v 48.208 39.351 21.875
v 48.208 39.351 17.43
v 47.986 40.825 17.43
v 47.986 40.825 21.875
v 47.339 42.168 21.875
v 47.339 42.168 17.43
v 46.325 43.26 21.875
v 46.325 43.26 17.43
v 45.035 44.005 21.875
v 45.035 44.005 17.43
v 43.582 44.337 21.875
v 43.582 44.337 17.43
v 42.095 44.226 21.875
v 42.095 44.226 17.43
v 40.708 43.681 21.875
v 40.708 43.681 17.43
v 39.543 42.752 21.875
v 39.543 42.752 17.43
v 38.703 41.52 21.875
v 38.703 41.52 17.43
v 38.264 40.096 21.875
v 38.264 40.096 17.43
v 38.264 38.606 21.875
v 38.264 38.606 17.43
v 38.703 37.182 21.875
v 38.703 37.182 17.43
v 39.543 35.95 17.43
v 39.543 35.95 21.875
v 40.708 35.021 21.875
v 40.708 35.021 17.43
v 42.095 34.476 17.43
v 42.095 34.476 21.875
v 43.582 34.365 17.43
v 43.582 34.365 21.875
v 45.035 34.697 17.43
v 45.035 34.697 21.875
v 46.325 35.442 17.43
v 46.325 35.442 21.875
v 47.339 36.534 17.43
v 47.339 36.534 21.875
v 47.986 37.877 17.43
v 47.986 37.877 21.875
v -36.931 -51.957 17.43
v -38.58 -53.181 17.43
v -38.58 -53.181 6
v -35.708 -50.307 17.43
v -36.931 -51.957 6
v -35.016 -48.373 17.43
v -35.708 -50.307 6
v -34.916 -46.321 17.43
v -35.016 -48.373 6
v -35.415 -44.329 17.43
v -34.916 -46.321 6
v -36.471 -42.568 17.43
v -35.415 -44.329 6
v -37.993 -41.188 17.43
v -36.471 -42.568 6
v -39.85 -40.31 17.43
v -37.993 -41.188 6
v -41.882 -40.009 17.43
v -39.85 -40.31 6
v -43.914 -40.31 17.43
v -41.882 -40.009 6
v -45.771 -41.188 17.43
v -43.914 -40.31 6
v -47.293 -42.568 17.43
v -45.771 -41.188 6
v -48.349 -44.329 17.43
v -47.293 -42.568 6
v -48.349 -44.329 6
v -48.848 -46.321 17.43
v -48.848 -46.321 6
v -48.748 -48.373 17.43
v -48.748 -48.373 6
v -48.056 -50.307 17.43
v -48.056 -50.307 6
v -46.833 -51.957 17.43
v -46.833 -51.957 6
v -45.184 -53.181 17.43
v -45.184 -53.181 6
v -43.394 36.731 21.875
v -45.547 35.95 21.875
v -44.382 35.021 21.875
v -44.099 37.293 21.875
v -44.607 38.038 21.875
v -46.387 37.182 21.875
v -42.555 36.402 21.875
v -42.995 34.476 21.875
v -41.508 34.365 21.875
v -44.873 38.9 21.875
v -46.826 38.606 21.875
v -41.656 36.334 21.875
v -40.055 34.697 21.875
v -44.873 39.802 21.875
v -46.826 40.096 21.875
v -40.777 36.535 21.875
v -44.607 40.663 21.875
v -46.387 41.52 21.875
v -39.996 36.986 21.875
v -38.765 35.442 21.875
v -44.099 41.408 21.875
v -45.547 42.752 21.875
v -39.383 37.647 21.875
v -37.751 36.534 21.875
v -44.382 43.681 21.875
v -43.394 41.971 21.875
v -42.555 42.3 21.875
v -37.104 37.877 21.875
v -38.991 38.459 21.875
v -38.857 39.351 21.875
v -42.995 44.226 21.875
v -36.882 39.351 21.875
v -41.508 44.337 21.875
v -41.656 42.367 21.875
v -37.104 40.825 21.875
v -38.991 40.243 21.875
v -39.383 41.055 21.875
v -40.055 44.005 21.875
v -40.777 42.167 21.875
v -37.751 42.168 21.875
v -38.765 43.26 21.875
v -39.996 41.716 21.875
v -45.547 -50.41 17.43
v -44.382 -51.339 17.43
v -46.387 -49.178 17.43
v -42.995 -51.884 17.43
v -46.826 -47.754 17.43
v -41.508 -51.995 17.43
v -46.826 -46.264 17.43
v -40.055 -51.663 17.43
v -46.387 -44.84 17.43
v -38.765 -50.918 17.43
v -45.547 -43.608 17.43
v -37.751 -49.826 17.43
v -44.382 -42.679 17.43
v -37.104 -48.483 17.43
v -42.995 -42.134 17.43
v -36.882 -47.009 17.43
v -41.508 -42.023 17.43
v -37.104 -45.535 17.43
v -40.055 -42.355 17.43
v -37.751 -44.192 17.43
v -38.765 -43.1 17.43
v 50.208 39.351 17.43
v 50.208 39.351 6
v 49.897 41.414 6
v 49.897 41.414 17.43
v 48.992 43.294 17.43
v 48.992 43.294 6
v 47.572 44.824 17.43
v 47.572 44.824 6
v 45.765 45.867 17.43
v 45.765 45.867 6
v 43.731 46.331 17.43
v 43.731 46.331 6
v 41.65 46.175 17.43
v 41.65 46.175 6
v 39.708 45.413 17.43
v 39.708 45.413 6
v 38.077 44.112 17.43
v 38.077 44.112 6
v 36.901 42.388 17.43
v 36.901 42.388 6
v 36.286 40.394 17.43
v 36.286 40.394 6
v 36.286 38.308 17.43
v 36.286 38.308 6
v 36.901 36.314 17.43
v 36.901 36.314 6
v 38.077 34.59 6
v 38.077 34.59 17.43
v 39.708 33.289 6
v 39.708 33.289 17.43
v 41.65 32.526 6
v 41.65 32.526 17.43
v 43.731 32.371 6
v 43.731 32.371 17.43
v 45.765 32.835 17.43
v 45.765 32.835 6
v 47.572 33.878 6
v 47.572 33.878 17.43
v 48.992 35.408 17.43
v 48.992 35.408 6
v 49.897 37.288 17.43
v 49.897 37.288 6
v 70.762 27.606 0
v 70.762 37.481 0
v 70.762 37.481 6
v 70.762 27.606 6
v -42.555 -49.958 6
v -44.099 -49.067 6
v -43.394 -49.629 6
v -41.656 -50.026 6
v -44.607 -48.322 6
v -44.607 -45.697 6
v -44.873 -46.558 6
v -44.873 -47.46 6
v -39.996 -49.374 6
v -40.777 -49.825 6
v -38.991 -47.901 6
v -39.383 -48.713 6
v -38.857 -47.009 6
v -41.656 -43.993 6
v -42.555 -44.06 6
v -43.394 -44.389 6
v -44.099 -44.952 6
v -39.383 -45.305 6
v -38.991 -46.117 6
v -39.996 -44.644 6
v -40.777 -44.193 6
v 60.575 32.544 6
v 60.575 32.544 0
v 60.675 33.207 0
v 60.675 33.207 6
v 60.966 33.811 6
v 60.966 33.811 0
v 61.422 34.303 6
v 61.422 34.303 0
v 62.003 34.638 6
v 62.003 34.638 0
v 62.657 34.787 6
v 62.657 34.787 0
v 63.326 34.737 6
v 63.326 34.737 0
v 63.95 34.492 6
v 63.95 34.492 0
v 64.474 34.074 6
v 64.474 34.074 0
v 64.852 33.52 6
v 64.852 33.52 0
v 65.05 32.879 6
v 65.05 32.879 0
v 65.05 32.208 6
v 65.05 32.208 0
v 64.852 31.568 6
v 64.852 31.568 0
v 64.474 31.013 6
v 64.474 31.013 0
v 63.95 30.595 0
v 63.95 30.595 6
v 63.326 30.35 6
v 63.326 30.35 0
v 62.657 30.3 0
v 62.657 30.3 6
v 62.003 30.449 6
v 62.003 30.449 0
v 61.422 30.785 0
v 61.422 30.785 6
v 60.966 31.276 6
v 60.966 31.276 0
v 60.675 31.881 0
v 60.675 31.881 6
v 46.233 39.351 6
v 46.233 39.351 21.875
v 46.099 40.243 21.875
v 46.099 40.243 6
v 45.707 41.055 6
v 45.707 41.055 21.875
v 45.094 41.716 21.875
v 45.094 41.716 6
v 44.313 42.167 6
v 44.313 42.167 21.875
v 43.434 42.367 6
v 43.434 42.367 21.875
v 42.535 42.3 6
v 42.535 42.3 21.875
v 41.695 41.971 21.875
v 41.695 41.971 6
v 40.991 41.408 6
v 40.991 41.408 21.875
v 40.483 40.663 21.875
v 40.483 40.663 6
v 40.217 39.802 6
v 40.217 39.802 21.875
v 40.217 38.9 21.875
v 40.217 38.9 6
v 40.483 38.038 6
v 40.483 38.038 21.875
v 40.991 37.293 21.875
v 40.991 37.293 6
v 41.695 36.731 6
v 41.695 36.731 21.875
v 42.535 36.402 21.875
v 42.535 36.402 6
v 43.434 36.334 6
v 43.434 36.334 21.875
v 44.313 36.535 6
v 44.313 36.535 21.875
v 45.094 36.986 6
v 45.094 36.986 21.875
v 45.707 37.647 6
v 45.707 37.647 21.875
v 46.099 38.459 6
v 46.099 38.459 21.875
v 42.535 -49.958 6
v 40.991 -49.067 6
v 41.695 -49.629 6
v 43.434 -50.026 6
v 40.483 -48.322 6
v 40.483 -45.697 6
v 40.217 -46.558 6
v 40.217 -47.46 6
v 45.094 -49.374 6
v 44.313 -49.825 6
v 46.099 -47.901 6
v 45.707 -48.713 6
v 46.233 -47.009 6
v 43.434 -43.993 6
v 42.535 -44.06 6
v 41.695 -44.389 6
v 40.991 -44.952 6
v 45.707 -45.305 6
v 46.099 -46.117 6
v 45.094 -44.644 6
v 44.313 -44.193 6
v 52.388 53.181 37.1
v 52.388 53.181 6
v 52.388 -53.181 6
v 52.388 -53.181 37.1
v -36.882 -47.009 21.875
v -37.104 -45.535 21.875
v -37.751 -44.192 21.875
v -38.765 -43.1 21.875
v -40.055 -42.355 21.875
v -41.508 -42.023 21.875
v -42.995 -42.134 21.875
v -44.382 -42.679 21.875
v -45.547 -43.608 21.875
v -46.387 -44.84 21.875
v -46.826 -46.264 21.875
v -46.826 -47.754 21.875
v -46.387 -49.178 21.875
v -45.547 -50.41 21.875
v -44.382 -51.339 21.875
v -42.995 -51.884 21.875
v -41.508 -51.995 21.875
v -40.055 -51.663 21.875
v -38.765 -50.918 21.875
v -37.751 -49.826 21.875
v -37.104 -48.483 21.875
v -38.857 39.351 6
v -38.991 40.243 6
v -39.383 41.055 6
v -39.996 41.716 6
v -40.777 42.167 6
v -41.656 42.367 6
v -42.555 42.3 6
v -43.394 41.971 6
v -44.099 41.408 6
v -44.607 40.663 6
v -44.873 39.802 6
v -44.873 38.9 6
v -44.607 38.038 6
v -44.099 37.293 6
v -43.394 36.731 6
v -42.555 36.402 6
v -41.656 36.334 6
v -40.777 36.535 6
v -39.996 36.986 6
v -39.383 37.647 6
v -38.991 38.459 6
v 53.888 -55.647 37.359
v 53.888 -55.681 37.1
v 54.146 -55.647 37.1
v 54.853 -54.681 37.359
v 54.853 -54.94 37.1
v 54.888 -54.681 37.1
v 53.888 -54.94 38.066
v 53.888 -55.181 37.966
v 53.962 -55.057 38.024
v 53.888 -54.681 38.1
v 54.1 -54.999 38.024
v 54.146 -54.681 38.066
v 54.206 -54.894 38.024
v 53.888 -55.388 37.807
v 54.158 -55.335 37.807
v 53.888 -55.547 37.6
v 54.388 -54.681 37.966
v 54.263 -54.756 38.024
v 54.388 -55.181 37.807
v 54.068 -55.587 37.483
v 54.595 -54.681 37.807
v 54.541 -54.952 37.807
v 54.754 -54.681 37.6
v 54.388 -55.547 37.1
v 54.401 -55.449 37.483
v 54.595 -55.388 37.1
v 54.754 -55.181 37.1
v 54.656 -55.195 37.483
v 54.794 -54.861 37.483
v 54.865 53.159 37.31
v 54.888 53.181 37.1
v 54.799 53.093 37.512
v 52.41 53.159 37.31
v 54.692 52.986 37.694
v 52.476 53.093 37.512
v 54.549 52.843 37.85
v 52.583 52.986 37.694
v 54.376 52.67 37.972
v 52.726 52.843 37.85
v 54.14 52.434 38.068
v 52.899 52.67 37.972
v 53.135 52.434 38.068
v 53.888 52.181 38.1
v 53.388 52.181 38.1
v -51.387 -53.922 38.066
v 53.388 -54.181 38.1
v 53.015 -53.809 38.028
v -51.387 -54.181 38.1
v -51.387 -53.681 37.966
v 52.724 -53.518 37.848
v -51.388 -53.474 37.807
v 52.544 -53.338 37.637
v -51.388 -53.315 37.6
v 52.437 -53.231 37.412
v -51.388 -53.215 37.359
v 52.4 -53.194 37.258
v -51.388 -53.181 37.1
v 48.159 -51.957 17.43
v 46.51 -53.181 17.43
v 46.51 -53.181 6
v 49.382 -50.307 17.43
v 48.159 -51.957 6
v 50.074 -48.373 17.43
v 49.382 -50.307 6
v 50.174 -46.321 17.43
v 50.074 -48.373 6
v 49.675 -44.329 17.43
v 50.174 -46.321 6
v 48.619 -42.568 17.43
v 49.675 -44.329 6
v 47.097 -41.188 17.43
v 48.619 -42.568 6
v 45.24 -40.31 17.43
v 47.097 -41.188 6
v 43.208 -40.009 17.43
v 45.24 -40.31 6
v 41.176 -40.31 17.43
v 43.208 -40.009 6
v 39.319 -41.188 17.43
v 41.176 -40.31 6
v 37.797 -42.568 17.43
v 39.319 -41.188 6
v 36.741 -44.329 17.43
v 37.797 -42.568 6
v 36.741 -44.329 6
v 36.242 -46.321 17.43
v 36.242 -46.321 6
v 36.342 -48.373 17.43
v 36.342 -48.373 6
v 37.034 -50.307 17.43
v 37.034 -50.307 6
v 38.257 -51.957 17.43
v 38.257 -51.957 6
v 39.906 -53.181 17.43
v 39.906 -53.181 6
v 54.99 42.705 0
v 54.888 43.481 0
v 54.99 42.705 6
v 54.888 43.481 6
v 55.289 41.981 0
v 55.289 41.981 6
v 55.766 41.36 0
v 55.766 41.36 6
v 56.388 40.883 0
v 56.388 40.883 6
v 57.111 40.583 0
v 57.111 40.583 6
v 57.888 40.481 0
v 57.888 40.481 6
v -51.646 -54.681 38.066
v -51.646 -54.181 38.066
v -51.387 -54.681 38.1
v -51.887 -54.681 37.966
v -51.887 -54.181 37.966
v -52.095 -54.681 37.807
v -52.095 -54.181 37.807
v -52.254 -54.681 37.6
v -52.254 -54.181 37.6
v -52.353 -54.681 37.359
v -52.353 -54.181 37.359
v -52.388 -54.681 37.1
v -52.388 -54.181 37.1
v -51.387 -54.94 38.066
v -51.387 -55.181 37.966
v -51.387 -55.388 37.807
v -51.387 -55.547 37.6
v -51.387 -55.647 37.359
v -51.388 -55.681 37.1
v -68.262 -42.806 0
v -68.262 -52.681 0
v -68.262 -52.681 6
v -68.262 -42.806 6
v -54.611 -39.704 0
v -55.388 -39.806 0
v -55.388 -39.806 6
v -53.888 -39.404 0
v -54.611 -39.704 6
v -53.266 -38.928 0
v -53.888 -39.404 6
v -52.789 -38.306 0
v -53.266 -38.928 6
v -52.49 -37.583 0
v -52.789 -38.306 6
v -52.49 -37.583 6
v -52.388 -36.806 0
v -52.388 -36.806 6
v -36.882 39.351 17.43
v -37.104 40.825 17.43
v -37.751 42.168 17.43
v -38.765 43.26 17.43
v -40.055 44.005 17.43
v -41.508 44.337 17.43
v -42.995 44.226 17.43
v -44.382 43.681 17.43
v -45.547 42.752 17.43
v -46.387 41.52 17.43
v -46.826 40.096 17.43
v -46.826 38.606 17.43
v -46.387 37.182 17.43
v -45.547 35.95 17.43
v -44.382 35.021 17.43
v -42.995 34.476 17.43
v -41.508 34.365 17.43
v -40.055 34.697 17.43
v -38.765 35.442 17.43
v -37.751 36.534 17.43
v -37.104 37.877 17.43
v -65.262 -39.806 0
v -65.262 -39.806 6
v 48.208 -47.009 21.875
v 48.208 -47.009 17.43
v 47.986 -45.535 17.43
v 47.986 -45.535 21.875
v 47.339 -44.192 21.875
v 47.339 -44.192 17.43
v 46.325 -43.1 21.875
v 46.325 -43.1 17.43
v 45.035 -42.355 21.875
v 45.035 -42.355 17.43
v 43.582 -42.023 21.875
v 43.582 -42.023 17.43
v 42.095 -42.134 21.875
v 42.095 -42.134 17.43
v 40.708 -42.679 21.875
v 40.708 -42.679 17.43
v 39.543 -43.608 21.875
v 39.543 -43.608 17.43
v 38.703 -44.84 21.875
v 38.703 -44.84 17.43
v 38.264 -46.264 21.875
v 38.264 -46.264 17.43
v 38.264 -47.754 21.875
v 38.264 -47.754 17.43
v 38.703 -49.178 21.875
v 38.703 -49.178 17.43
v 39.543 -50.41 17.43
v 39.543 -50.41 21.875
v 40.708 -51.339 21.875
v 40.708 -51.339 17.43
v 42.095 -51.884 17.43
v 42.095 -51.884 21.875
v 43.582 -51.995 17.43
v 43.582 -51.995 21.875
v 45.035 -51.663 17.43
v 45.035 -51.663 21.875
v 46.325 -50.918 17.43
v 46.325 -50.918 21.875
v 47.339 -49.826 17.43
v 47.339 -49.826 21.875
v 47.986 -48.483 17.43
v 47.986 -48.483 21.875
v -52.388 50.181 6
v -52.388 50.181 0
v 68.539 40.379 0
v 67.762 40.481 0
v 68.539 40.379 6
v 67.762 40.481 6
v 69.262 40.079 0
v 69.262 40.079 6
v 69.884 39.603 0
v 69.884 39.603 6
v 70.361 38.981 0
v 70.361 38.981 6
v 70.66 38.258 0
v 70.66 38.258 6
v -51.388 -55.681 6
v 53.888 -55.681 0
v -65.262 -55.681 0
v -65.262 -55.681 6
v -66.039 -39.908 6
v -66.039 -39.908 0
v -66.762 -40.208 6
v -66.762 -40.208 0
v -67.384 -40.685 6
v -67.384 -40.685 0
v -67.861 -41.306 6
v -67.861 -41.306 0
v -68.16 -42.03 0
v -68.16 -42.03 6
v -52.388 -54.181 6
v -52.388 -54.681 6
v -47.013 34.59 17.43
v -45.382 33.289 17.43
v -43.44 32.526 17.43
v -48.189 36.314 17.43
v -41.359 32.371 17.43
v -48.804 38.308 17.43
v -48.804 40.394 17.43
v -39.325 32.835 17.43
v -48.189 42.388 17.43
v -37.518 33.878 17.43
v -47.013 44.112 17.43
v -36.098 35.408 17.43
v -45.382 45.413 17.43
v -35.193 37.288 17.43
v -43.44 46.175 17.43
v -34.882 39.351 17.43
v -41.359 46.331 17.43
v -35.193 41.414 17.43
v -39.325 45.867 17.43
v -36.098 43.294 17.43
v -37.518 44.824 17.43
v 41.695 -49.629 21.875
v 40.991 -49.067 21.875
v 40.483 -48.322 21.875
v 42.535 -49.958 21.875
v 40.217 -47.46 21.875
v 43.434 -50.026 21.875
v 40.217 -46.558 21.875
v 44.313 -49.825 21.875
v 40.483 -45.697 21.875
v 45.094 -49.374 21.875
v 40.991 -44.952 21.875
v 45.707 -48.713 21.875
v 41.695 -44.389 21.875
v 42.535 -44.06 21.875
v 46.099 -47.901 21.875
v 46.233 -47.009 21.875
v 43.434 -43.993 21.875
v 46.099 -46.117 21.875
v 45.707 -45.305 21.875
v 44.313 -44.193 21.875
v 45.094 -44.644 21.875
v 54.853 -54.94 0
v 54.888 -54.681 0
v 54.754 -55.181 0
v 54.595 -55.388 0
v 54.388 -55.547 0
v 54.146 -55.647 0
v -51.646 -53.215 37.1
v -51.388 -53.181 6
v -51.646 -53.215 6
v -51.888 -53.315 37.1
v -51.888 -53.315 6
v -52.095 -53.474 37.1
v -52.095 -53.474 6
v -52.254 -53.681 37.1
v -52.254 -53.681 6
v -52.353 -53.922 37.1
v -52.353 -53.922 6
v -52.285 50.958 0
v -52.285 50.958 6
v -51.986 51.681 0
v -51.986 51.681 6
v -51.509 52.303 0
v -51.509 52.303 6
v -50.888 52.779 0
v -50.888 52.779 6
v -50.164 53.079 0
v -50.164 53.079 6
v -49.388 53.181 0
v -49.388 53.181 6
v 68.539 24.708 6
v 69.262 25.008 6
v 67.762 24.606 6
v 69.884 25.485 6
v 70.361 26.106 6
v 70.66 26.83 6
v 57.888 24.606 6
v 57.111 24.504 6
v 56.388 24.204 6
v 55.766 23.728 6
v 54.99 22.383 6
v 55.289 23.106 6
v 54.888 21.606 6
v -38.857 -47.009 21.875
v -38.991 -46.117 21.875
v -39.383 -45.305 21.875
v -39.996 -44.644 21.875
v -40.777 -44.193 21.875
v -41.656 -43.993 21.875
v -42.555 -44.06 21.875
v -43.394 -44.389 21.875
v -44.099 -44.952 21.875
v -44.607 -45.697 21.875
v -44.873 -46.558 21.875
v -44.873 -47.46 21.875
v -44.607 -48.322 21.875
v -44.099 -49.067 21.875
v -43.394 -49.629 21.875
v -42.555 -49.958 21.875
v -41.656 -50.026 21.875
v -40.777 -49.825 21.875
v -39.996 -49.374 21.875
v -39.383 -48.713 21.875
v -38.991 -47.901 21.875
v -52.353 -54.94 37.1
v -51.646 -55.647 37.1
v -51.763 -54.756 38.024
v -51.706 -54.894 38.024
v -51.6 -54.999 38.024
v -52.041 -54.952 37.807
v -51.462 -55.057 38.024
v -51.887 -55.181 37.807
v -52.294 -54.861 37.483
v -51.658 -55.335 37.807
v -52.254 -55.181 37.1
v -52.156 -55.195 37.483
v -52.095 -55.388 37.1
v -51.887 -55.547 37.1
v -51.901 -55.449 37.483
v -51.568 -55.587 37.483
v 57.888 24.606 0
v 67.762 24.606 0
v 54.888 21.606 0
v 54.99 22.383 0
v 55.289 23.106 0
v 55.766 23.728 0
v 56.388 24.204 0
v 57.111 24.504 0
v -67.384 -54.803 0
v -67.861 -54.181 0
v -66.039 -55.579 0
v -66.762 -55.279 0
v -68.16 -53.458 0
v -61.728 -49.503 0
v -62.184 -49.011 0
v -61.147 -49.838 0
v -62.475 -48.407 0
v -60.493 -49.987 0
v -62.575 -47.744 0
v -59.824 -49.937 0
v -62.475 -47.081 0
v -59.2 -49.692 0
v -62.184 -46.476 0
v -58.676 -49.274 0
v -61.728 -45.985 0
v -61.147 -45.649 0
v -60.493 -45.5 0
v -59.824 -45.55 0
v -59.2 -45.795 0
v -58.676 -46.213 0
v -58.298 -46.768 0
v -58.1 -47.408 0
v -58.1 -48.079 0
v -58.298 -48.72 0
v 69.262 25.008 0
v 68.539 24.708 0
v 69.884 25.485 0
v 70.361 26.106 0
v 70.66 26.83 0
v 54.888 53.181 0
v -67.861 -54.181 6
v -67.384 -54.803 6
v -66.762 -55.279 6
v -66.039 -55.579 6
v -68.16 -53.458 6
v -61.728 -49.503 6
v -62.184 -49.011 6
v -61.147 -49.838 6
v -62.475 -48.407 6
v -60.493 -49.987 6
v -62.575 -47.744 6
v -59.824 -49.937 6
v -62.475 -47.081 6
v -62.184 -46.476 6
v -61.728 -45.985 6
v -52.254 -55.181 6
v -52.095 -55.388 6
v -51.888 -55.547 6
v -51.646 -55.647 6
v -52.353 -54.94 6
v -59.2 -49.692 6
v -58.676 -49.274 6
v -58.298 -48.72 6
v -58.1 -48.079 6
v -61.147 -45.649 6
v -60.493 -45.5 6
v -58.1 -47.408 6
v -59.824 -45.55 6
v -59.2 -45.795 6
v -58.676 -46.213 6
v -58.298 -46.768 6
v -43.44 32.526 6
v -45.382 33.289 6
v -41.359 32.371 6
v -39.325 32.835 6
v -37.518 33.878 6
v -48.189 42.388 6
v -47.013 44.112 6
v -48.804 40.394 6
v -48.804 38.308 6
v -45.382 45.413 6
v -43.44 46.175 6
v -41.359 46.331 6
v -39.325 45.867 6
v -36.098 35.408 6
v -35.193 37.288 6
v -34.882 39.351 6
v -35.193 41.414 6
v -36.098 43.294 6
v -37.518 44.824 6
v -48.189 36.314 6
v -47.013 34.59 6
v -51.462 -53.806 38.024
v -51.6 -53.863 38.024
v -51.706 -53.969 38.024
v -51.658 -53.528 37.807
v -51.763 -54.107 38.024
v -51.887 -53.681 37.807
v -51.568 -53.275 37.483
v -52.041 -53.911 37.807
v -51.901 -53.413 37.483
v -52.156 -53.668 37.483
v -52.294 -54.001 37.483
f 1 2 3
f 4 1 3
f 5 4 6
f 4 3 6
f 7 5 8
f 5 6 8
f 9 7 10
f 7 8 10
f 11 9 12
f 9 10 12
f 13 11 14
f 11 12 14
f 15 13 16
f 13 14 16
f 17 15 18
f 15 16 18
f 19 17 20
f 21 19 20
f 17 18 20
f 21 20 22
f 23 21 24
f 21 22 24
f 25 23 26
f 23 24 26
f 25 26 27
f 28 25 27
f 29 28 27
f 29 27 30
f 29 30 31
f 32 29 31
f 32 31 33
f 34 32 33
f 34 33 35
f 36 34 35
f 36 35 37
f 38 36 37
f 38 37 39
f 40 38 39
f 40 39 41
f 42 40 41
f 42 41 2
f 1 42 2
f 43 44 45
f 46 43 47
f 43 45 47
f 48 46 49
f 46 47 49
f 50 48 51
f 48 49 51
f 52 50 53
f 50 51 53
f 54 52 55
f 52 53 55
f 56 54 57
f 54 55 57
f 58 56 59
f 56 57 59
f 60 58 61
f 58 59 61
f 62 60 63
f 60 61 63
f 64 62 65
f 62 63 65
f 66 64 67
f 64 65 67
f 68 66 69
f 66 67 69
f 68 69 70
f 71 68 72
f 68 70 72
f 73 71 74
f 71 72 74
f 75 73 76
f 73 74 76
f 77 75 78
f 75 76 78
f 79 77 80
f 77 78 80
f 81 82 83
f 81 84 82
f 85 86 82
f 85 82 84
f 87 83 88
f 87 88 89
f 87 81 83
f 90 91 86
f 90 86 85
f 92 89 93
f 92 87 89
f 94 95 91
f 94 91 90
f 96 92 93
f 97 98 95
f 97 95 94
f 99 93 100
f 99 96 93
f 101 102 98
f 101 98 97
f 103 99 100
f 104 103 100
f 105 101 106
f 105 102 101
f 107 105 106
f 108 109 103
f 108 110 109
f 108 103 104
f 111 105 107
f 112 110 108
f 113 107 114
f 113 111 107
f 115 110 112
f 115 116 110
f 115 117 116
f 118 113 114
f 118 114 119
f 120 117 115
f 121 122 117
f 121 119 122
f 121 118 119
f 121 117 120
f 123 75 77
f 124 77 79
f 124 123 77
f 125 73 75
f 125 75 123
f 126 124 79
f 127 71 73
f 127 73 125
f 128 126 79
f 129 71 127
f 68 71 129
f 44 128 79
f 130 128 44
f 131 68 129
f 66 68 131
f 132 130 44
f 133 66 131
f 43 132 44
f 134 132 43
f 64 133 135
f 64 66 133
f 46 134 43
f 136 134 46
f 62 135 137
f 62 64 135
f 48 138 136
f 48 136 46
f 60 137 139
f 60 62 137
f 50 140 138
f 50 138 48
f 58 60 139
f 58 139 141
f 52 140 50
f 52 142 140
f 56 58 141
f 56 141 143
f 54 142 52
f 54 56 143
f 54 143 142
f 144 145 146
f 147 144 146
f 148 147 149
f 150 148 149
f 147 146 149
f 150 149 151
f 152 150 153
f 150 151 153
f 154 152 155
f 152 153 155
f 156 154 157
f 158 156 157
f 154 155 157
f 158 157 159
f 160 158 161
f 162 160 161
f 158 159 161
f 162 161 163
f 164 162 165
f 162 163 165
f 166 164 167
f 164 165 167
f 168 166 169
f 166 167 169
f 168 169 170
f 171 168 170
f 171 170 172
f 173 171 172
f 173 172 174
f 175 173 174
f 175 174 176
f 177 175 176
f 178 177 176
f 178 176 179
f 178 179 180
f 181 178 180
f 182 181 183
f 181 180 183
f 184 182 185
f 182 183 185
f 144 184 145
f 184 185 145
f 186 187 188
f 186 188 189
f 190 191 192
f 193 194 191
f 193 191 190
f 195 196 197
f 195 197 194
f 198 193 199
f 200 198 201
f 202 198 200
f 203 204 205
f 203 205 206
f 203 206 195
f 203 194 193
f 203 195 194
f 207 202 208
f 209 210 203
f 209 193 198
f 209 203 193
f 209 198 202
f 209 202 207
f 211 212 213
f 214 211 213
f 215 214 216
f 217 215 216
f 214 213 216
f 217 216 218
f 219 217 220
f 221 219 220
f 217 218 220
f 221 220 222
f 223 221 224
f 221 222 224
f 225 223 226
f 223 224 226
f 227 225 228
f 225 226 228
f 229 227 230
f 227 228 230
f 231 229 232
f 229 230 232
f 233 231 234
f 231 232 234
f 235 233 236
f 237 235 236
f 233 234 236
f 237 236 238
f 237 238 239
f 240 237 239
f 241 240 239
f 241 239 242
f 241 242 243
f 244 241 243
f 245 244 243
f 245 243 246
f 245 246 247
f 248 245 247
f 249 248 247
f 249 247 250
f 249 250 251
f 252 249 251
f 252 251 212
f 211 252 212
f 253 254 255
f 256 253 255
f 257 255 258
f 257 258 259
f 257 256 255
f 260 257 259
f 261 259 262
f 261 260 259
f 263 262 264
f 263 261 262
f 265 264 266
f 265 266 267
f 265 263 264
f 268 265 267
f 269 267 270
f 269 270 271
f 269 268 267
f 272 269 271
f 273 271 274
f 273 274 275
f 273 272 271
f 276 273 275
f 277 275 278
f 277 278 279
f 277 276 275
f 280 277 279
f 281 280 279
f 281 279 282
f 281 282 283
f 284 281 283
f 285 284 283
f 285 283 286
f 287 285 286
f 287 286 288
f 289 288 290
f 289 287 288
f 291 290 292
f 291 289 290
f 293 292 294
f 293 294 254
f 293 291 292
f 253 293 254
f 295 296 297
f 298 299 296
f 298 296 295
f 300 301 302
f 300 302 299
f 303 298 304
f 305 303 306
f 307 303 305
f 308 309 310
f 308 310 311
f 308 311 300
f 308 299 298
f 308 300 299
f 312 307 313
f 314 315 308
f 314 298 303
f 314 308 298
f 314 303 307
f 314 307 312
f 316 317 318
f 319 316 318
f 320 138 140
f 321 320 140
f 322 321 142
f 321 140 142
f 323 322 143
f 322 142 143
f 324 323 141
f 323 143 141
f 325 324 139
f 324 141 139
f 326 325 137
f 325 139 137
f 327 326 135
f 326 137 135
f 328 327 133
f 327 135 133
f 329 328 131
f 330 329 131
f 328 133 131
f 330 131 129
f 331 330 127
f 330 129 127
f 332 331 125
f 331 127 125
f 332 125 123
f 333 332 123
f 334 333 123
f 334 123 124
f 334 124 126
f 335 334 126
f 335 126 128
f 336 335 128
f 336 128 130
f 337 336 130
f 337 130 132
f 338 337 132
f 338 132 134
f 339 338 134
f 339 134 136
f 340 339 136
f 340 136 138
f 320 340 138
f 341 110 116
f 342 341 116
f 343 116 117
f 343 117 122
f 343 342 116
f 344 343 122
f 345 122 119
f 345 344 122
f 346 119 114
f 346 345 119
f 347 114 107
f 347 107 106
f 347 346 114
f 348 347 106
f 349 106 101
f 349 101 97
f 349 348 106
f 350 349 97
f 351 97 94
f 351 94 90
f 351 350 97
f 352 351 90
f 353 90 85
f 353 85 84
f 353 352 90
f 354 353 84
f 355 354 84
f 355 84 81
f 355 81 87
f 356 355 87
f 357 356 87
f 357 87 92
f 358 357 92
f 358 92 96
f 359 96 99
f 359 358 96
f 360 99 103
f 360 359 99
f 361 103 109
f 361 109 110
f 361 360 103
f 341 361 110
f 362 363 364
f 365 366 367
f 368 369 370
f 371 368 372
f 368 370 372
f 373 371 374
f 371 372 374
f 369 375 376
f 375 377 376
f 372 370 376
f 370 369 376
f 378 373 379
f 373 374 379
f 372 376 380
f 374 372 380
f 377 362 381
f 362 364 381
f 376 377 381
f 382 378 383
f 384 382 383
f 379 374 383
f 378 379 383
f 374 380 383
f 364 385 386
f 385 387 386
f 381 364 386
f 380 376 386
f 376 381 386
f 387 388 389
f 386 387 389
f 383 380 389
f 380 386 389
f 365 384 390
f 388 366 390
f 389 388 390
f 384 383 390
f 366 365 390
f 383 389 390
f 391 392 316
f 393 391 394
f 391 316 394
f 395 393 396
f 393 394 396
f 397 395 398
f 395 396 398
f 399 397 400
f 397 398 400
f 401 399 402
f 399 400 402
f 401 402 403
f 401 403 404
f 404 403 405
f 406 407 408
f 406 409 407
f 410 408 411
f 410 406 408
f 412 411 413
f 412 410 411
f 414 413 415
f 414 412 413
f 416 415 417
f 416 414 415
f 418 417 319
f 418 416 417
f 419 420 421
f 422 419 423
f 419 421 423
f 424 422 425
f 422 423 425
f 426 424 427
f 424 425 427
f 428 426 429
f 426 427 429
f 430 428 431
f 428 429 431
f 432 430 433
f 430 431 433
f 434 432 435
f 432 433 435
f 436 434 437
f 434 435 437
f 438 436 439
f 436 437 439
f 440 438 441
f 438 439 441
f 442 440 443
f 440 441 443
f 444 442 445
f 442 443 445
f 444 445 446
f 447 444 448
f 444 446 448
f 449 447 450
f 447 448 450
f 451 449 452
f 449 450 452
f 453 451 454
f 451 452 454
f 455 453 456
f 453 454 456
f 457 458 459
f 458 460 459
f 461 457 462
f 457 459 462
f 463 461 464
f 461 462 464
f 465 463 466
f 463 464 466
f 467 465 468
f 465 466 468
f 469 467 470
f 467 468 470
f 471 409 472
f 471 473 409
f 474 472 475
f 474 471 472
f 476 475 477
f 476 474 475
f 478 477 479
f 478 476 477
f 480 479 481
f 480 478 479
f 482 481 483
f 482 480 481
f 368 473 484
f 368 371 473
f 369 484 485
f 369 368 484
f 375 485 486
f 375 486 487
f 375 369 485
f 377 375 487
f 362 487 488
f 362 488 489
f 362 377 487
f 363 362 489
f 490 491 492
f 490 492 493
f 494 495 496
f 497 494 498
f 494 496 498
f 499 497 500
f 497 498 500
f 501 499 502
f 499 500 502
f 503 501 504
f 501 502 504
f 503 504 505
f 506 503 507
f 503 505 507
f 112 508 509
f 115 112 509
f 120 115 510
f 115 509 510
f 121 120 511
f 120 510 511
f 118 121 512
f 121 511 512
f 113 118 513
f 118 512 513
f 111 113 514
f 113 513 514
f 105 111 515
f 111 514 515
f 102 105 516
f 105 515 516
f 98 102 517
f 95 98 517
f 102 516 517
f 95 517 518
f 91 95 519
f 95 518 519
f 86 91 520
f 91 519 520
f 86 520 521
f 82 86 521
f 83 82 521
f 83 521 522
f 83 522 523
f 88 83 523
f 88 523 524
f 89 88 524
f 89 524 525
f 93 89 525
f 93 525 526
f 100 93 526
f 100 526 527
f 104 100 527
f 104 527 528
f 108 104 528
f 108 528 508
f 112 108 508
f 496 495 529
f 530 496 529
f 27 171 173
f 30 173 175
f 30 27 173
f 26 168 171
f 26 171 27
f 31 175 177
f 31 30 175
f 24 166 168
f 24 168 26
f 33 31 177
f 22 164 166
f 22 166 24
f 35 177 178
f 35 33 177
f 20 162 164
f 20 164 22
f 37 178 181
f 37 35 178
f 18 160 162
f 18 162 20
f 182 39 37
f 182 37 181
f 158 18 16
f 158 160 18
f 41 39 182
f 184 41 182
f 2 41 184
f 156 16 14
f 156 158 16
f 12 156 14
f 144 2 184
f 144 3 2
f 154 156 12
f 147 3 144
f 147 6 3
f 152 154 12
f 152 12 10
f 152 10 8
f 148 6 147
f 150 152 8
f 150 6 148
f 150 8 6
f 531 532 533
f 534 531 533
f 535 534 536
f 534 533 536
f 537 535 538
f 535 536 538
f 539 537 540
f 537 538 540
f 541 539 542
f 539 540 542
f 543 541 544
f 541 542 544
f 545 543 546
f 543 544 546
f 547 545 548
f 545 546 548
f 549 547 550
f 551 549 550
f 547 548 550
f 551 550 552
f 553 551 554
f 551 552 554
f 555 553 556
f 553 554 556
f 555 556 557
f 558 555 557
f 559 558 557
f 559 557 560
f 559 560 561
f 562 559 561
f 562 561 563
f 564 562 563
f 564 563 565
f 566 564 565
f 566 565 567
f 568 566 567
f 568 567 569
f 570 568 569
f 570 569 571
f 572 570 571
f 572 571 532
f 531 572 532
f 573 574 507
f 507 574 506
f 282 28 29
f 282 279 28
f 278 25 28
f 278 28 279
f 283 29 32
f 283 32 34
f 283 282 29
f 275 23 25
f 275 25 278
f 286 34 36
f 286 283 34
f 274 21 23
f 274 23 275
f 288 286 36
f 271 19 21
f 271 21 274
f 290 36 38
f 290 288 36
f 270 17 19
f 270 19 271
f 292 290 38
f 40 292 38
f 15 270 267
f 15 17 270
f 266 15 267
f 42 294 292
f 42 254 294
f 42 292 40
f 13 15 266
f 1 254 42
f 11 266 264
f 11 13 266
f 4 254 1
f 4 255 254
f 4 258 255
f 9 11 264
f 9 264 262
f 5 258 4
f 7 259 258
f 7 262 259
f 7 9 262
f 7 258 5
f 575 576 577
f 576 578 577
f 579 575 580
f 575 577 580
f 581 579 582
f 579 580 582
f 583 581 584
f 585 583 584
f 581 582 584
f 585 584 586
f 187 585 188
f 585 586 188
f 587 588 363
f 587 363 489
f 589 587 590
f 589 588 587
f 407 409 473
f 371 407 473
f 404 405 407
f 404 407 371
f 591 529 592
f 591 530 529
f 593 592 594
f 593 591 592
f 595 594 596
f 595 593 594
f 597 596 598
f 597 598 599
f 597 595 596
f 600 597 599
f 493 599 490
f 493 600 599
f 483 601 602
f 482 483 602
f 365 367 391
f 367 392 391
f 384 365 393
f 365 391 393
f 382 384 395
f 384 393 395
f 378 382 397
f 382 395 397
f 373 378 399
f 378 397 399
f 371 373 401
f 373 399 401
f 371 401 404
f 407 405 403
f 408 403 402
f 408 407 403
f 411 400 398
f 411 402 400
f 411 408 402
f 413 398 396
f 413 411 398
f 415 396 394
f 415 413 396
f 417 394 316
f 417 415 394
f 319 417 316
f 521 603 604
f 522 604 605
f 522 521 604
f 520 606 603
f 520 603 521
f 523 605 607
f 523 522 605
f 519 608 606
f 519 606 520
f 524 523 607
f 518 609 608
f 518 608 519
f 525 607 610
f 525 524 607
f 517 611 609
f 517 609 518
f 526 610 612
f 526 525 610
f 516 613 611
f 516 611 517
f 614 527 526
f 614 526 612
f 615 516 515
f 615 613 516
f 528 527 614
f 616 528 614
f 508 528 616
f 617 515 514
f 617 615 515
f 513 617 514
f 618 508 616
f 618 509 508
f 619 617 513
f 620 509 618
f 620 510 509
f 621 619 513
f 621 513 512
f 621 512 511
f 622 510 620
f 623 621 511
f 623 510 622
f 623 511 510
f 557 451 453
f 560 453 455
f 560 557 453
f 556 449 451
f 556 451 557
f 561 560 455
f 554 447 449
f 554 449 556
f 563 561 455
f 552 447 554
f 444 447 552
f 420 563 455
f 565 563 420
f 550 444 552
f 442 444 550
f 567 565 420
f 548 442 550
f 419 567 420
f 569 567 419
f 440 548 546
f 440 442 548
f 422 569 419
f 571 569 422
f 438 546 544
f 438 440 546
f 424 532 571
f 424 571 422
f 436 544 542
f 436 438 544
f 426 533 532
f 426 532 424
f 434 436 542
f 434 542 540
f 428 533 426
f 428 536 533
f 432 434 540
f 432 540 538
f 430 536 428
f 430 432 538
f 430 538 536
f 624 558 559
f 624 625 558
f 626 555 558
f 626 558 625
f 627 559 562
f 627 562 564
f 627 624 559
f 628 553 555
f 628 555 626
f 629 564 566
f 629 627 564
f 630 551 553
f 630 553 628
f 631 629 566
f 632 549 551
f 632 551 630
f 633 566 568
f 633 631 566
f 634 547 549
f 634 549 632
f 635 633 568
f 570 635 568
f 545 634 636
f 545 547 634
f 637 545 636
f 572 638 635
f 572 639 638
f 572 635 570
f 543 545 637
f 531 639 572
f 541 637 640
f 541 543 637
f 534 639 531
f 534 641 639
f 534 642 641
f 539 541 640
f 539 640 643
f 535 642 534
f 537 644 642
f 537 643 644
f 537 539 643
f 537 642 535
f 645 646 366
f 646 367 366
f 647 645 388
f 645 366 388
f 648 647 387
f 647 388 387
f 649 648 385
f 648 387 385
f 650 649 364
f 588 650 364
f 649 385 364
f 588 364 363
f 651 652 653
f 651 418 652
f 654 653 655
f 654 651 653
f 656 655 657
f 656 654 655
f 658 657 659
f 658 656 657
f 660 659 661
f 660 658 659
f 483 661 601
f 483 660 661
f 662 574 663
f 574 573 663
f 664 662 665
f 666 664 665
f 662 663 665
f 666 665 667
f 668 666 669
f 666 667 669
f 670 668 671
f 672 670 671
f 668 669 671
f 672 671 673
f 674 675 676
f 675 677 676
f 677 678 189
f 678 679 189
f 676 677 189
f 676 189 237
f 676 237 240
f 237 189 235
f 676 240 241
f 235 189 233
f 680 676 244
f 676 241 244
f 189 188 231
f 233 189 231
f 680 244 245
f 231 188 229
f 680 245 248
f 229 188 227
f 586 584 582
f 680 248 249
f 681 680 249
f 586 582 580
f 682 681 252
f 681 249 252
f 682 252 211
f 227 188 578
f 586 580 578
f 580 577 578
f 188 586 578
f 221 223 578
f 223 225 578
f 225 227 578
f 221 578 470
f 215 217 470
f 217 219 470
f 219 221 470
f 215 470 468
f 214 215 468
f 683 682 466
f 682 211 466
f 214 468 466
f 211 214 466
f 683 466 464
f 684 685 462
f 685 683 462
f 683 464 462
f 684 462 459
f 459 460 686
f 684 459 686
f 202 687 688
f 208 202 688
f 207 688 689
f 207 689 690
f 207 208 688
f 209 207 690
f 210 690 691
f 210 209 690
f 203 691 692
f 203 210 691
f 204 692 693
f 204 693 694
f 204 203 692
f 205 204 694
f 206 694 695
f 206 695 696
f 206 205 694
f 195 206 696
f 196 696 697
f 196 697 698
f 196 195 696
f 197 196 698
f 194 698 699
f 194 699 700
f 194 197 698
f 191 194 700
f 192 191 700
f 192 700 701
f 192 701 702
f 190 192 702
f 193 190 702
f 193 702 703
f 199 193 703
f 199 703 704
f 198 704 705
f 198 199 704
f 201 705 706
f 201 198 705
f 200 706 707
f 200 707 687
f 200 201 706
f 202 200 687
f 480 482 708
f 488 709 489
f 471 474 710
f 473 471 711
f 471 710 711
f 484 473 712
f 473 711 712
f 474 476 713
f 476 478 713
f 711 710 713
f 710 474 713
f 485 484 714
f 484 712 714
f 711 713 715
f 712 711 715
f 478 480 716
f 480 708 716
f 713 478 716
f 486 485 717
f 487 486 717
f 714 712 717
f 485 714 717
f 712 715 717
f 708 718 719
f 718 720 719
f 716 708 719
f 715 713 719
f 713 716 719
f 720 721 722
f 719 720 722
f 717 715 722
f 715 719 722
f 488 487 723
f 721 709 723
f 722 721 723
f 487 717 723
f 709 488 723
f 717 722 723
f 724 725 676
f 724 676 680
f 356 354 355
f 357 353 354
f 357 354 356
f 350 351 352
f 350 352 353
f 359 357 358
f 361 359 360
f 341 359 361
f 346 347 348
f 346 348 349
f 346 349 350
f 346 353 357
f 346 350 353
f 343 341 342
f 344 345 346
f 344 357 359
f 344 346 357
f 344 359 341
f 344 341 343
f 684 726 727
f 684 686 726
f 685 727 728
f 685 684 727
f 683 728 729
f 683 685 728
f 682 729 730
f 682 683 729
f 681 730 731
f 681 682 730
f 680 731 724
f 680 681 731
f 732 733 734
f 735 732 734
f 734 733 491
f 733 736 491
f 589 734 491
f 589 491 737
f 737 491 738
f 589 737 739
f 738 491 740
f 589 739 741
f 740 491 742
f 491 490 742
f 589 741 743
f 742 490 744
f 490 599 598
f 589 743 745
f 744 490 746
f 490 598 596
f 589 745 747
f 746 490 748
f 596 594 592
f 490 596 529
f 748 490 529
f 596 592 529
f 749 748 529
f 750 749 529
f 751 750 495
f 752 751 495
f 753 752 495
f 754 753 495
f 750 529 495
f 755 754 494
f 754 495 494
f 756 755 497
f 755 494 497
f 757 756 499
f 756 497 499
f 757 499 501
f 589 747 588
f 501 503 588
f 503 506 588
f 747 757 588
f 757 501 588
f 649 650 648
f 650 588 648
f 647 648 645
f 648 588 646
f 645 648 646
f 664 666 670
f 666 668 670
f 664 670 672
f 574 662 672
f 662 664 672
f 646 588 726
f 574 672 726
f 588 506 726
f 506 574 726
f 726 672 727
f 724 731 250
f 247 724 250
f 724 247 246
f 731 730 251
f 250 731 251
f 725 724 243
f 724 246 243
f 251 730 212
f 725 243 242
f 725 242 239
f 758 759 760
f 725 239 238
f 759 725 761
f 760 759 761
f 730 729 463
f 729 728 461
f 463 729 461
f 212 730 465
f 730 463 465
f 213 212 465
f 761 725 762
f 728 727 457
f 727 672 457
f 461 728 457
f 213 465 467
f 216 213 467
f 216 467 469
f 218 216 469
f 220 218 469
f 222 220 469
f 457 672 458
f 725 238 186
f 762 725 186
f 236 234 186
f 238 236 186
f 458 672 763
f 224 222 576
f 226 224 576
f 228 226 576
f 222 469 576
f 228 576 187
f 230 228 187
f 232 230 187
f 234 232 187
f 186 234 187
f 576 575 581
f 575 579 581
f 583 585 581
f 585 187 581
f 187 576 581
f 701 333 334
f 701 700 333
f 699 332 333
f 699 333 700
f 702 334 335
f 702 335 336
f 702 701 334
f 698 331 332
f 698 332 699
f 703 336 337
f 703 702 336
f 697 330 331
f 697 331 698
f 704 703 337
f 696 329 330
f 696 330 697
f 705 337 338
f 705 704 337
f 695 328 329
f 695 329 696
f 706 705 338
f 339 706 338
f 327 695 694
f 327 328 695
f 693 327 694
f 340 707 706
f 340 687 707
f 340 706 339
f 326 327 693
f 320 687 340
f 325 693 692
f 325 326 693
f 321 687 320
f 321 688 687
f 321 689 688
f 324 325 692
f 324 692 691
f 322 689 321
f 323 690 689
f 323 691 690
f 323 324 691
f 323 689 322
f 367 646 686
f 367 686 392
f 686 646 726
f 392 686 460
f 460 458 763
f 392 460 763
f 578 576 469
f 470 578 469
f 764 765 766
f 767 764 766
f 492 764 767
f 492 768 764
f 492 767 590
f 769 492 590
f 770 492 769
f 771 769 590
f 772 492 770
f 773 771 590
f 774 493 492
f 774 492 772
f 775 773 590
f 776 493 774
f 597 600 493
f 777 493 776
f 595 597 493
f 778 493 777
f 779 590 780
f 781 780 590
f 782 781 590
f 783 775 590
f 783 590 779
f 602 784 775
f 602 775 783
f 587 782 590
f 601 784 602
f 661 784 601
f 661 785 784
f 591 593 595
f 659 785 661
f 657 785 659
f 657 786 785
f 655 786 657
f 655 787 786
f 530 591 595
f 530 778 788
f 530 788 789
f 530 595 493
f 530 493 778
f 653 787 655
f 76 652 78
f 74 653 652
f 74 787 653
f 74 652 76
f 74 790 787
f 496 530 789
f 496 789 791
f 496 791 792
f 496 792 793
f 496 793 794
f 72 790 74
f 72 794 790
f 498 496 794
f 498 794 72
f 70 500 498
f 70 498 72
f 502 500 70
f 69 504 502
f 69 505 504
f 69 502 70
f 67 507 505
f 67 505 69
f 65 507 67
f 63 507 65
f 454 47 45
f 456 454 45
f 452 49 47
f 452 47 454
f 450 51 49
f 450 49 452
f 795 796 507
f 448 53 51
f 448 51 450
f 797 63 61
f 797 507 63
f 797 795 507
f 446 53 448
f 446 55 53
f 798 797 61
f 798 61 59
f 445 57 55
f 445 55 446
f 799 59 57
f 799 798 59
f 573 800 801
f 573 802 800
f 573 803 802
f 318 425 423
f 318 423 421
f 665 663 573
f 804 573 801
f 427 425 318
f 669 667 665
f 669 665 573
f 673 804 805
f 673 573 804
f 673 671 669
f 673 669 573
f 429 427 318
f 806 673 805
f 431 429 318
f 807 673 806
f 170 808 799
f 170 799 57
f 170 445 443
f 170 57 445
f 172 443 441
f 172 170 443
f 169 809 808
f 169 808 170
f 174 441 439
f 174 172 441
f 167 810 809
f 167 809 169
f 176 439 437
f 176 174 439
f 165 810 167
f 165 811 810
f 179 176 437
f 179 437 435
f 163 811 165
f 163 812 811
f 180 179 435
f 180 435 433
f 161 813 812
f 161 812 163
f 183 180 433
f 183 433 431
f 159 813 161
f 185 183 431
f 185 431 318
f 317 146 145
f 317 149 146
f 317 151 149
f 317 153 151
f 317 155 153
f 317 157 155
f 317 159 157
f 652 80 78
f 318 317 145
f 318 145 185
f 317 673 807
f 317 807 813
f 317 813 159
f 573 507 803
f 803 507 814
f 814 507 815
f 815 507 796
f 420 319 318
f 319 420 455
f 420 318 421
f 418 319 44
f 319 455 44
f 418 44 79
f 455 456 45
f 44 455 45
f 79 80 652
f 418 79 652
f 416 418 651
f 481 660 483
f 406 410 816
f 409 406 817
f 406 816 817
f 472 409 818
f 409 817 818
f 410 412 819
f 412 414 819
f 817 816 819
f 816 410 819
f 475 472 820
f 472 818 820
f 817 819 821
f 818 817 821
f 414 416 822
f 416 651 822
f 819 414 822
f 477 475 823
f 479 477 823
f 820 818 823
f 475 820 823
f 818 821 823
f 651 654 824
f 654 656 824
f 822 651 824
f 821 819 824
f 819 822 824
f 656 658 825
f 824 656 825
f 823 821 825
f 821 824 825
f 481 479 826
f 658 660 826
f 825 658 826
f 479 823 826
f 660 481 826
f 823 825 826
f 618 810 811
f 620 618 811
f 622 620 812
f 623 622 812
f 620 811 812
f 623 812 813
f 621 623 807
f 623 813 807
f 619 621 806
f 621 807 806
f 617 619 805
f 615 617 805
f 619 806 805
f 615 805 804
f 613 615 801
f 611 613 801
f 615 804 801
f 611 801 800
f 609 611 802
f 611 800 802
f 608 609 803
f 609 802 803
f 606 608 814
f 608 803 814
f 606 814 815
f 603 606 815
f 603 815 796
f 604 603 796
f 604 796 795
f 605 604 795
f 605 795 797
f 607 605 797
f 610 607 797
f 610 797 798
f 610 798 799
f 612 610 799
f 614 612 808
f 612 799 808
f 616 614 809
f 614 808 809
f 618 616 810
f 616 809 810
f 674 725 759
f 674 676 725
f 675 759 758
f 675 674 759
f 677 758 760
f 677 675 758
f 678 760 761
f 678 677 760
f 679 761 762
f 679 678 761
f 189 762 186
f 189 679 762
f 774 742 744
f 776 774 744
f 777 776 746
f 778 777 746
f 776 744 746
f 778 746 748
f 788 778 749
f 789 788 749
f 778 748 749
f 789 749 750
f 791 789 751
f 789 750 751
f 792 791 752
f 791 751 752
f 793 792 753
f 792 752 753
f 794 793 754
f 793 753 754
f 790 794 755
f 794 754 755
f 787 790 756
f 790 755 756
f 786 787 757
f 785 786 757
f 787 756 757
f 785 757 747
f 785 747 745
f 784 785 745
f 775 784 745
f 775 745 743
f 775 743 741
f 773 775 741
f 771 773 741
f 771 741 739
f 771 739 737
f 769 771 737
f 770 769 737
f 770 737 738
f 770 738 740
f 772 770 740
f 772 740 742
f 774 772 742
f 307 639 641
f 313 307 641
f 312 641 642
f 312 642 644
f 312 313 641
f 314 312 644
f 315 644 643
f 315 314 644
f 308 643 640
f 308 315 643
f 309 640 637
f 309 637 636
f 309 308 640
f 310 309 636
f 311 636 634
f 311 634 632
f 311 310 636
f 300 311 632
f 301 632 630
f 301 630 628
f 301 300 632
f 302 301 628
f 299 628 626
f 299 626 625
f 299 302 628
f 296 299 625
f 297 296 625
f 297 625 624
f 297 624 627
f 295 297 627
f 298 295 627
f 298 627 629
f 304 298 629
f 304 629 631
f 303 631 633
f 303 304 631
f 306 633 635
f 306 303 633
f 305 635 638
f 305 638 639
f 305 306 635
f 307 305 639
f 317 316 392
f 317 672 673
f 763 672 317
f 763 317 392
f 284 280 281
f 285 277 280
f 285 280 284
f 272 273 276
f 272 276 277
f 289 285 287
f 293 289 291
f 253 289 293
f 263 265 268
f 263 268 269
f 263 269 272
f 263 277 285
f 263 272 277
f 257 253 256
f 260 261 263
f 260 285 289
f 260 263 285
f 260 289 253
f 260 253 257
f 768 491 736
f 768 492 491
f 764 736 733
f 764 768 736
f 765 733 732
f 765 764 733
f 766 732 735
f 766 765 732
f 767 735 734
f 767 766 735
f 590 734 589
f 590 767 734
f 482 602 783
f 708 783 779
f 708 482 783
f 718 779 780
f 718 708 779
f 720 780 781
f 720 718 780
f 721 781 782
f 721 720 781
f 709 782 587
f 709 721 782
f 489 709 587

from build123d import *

# Parameters (mm, degrees)
SKETCH1_W            = 104.775
SKETCH1_H            = 106.3625
BOSS_EXTRUDE1_DEPTH  = 6
BOSS_EXTRUDE2_DEPTH  = 38.1
SKETCH3_R            = 5
SKETCH3_R_2          = 3.025
BOSS_EXTRUDE3_DEPTH  = 15.875
SKETCH4_R            = 7
SKETCH4_R_2          = 3.025
BOSS_EXTRUDE4_DEPTH  = 11.43
BOSS_EXTRUDE5_DEPTH  = 6
M4_CLEARANCE_HOLE1_D = 4.5
FILLET2_R            = 3
FILLET3_R            = 1


with BuildPart() as part:
    # Sketch1 → Boss-Extrude1 (new body)
    with BuildSketch(Plane.XY):
        Rectangle(SKETCH1_W, SKETCH1_H)
    extrude(amount=BOSS_EXTRUDE1_DEPTH)

    # Sketch2 → Boss-Extrude2 (add)
    with BuildSketch(Plane.XY):
        Polygon((-52.3875, -53.18125), (-52.3875, -55.68125), (54.8875, -55.68125), (54.8875, 53.18125), (52.3875, 53.18125), (52.3875, -53.18125), align=None)
    extrude(amount=BOSS_EXTRUDE2_DEPTH)

    # Sketch3 → Boss-Extrude3 (add)
    with BuildSketch(Plane.XY.offset(6)):
        with Locations((43.208, 39.35095)):
            Circle(SKETCH3_R)
        with Locations((43.208, 39.35095)):
            Circle(SKETCH3_R_2, mode=Mode.SUBTRACT)
        with Locations((-41.882, 39.35095)):
            Circle(SKETCH3_R)
        with Locations((-41.882, 39.35095)):
            Circle(SKETCH3_R_2, mode=Mode.SUBTRACT)
        with Locations((-41.882, -47.00905)):
            Circle(SKETCH3_R)
        with Locations((-41.882, -47.00905)):
            Circle(SKETCH3_R_2, mode=Mode.SUBTRACT)
        with Locations((43.208, -47.00905)):
            Circle(SKETCH3_R)
        with Locations((43.208, -47.00905)):
            Circle(SKETCH3_R_2, mode=Mode.SUBTRACT)
    extrude(amount=BOSS_EXTRUDE3_DEPTH)

    # Sketch4 → Boss-Extrude4 (add)
    with BuildSketch(Plane.XY.offset(6)):
        with Locations((43.208, 39.35095)):
            Circle(SKETCH4_R)
        with Locations((43.208, 39.35095)):
            Circle(SKETCH4_R_2, mode=Mode.SUBTRACT)
        with Locations((-41.882, 39.35095)):
            Circle(SKETCH4_R)
        with Locations((-41.882, 39.35095)):
            Circle(SKETCH4_R_2, mode=Mode.SUBTRACT)
        with Locations((-41.882, -47.00905)):
            Circle(SKETCH4_R)
        with Locations((-41.882, -47.00905)):
            Circle(SKETCH4_R_2, mode=Mode.SUBTRACT)
        with Locations((43.208, -47.00905)):
            Circle(SKETCH4_R)
        with Locations((43.208, -47.00905)):
            Circle(SKETCH4_R_2, mode=Mode.SUBTRACT)
    extrude(amount=BOSS_EXTRUDE4_DEPTH)

    # Sketch6 → Boss-Extrude5 (add)
    with BuildSketch(Plane.XY):
        Polygon((-52.3875, -55.68125), (-52.3875, -39.80625), (-68.2625, -39.80625), align=None)
        Polygon((-68.2625, -55.68125), (-68.2625, -39.80625), (-52.3875, -55.68125), align=None)
        Polygon((54.8875, 24.60625), (70.7625, 40.48125), (70.7625, 24.60625), align=None)
        Polygon((54.8875, 40.48125), (54.8875, 24.60625), (70.7625, 40.48125), align=None)
    extrude(amount=BOSS_EXTRUDE5_DEPTH)

    # M4 Clearance Hole1 (through all)
    with Locations(Plane.XY.offset(6)):
        with Locations((62.825, 32.54375), (-60.325, -47.74375)):
            Hole(M4_CLEARANCE_HOLE1_D / 2)

    # Fillet2
    fillet2_edges = [part.edges().sort_by_distance(p)[0] for p in [
        (-52.3875, -39.80625, 3),
        (-68.2625, -39.80625, 3),
        (-68.2625, -55.68125, 3),
        (70.7625, 24.60625, 3),
        (70.7625, 40.48125, 3),
        (54.8875, 40.48125, 3),
        (54.8875, 24.60625, 3),
        (-52.3875, 53.18125, 3),
    ]]
    fillet(fillet2_edges, radius=FILLET2_R)

    # Fillet3
    fillet3_edges = [part.edges().sort_by_distance(p)[0] for p in [
        (-52.3875, -53.18125, 22.05),
        (-52.3875, -55.68125, 22.05),
        (54.8875, -55.68125, 19.05),
        (0, -53.18125, 38.1),
        (-52.3875, -54.43125, 38.1),
        (1.25, -55.68125, 38.1),
        (54.8875, -1.25, 38.1),
        (53.6375, 53.18125, 38.1),
        (52.3875, 0, 38.1),
    ]]
    fillet(fillet3_edges, radius=FILLET3_R)


solid = part.part
